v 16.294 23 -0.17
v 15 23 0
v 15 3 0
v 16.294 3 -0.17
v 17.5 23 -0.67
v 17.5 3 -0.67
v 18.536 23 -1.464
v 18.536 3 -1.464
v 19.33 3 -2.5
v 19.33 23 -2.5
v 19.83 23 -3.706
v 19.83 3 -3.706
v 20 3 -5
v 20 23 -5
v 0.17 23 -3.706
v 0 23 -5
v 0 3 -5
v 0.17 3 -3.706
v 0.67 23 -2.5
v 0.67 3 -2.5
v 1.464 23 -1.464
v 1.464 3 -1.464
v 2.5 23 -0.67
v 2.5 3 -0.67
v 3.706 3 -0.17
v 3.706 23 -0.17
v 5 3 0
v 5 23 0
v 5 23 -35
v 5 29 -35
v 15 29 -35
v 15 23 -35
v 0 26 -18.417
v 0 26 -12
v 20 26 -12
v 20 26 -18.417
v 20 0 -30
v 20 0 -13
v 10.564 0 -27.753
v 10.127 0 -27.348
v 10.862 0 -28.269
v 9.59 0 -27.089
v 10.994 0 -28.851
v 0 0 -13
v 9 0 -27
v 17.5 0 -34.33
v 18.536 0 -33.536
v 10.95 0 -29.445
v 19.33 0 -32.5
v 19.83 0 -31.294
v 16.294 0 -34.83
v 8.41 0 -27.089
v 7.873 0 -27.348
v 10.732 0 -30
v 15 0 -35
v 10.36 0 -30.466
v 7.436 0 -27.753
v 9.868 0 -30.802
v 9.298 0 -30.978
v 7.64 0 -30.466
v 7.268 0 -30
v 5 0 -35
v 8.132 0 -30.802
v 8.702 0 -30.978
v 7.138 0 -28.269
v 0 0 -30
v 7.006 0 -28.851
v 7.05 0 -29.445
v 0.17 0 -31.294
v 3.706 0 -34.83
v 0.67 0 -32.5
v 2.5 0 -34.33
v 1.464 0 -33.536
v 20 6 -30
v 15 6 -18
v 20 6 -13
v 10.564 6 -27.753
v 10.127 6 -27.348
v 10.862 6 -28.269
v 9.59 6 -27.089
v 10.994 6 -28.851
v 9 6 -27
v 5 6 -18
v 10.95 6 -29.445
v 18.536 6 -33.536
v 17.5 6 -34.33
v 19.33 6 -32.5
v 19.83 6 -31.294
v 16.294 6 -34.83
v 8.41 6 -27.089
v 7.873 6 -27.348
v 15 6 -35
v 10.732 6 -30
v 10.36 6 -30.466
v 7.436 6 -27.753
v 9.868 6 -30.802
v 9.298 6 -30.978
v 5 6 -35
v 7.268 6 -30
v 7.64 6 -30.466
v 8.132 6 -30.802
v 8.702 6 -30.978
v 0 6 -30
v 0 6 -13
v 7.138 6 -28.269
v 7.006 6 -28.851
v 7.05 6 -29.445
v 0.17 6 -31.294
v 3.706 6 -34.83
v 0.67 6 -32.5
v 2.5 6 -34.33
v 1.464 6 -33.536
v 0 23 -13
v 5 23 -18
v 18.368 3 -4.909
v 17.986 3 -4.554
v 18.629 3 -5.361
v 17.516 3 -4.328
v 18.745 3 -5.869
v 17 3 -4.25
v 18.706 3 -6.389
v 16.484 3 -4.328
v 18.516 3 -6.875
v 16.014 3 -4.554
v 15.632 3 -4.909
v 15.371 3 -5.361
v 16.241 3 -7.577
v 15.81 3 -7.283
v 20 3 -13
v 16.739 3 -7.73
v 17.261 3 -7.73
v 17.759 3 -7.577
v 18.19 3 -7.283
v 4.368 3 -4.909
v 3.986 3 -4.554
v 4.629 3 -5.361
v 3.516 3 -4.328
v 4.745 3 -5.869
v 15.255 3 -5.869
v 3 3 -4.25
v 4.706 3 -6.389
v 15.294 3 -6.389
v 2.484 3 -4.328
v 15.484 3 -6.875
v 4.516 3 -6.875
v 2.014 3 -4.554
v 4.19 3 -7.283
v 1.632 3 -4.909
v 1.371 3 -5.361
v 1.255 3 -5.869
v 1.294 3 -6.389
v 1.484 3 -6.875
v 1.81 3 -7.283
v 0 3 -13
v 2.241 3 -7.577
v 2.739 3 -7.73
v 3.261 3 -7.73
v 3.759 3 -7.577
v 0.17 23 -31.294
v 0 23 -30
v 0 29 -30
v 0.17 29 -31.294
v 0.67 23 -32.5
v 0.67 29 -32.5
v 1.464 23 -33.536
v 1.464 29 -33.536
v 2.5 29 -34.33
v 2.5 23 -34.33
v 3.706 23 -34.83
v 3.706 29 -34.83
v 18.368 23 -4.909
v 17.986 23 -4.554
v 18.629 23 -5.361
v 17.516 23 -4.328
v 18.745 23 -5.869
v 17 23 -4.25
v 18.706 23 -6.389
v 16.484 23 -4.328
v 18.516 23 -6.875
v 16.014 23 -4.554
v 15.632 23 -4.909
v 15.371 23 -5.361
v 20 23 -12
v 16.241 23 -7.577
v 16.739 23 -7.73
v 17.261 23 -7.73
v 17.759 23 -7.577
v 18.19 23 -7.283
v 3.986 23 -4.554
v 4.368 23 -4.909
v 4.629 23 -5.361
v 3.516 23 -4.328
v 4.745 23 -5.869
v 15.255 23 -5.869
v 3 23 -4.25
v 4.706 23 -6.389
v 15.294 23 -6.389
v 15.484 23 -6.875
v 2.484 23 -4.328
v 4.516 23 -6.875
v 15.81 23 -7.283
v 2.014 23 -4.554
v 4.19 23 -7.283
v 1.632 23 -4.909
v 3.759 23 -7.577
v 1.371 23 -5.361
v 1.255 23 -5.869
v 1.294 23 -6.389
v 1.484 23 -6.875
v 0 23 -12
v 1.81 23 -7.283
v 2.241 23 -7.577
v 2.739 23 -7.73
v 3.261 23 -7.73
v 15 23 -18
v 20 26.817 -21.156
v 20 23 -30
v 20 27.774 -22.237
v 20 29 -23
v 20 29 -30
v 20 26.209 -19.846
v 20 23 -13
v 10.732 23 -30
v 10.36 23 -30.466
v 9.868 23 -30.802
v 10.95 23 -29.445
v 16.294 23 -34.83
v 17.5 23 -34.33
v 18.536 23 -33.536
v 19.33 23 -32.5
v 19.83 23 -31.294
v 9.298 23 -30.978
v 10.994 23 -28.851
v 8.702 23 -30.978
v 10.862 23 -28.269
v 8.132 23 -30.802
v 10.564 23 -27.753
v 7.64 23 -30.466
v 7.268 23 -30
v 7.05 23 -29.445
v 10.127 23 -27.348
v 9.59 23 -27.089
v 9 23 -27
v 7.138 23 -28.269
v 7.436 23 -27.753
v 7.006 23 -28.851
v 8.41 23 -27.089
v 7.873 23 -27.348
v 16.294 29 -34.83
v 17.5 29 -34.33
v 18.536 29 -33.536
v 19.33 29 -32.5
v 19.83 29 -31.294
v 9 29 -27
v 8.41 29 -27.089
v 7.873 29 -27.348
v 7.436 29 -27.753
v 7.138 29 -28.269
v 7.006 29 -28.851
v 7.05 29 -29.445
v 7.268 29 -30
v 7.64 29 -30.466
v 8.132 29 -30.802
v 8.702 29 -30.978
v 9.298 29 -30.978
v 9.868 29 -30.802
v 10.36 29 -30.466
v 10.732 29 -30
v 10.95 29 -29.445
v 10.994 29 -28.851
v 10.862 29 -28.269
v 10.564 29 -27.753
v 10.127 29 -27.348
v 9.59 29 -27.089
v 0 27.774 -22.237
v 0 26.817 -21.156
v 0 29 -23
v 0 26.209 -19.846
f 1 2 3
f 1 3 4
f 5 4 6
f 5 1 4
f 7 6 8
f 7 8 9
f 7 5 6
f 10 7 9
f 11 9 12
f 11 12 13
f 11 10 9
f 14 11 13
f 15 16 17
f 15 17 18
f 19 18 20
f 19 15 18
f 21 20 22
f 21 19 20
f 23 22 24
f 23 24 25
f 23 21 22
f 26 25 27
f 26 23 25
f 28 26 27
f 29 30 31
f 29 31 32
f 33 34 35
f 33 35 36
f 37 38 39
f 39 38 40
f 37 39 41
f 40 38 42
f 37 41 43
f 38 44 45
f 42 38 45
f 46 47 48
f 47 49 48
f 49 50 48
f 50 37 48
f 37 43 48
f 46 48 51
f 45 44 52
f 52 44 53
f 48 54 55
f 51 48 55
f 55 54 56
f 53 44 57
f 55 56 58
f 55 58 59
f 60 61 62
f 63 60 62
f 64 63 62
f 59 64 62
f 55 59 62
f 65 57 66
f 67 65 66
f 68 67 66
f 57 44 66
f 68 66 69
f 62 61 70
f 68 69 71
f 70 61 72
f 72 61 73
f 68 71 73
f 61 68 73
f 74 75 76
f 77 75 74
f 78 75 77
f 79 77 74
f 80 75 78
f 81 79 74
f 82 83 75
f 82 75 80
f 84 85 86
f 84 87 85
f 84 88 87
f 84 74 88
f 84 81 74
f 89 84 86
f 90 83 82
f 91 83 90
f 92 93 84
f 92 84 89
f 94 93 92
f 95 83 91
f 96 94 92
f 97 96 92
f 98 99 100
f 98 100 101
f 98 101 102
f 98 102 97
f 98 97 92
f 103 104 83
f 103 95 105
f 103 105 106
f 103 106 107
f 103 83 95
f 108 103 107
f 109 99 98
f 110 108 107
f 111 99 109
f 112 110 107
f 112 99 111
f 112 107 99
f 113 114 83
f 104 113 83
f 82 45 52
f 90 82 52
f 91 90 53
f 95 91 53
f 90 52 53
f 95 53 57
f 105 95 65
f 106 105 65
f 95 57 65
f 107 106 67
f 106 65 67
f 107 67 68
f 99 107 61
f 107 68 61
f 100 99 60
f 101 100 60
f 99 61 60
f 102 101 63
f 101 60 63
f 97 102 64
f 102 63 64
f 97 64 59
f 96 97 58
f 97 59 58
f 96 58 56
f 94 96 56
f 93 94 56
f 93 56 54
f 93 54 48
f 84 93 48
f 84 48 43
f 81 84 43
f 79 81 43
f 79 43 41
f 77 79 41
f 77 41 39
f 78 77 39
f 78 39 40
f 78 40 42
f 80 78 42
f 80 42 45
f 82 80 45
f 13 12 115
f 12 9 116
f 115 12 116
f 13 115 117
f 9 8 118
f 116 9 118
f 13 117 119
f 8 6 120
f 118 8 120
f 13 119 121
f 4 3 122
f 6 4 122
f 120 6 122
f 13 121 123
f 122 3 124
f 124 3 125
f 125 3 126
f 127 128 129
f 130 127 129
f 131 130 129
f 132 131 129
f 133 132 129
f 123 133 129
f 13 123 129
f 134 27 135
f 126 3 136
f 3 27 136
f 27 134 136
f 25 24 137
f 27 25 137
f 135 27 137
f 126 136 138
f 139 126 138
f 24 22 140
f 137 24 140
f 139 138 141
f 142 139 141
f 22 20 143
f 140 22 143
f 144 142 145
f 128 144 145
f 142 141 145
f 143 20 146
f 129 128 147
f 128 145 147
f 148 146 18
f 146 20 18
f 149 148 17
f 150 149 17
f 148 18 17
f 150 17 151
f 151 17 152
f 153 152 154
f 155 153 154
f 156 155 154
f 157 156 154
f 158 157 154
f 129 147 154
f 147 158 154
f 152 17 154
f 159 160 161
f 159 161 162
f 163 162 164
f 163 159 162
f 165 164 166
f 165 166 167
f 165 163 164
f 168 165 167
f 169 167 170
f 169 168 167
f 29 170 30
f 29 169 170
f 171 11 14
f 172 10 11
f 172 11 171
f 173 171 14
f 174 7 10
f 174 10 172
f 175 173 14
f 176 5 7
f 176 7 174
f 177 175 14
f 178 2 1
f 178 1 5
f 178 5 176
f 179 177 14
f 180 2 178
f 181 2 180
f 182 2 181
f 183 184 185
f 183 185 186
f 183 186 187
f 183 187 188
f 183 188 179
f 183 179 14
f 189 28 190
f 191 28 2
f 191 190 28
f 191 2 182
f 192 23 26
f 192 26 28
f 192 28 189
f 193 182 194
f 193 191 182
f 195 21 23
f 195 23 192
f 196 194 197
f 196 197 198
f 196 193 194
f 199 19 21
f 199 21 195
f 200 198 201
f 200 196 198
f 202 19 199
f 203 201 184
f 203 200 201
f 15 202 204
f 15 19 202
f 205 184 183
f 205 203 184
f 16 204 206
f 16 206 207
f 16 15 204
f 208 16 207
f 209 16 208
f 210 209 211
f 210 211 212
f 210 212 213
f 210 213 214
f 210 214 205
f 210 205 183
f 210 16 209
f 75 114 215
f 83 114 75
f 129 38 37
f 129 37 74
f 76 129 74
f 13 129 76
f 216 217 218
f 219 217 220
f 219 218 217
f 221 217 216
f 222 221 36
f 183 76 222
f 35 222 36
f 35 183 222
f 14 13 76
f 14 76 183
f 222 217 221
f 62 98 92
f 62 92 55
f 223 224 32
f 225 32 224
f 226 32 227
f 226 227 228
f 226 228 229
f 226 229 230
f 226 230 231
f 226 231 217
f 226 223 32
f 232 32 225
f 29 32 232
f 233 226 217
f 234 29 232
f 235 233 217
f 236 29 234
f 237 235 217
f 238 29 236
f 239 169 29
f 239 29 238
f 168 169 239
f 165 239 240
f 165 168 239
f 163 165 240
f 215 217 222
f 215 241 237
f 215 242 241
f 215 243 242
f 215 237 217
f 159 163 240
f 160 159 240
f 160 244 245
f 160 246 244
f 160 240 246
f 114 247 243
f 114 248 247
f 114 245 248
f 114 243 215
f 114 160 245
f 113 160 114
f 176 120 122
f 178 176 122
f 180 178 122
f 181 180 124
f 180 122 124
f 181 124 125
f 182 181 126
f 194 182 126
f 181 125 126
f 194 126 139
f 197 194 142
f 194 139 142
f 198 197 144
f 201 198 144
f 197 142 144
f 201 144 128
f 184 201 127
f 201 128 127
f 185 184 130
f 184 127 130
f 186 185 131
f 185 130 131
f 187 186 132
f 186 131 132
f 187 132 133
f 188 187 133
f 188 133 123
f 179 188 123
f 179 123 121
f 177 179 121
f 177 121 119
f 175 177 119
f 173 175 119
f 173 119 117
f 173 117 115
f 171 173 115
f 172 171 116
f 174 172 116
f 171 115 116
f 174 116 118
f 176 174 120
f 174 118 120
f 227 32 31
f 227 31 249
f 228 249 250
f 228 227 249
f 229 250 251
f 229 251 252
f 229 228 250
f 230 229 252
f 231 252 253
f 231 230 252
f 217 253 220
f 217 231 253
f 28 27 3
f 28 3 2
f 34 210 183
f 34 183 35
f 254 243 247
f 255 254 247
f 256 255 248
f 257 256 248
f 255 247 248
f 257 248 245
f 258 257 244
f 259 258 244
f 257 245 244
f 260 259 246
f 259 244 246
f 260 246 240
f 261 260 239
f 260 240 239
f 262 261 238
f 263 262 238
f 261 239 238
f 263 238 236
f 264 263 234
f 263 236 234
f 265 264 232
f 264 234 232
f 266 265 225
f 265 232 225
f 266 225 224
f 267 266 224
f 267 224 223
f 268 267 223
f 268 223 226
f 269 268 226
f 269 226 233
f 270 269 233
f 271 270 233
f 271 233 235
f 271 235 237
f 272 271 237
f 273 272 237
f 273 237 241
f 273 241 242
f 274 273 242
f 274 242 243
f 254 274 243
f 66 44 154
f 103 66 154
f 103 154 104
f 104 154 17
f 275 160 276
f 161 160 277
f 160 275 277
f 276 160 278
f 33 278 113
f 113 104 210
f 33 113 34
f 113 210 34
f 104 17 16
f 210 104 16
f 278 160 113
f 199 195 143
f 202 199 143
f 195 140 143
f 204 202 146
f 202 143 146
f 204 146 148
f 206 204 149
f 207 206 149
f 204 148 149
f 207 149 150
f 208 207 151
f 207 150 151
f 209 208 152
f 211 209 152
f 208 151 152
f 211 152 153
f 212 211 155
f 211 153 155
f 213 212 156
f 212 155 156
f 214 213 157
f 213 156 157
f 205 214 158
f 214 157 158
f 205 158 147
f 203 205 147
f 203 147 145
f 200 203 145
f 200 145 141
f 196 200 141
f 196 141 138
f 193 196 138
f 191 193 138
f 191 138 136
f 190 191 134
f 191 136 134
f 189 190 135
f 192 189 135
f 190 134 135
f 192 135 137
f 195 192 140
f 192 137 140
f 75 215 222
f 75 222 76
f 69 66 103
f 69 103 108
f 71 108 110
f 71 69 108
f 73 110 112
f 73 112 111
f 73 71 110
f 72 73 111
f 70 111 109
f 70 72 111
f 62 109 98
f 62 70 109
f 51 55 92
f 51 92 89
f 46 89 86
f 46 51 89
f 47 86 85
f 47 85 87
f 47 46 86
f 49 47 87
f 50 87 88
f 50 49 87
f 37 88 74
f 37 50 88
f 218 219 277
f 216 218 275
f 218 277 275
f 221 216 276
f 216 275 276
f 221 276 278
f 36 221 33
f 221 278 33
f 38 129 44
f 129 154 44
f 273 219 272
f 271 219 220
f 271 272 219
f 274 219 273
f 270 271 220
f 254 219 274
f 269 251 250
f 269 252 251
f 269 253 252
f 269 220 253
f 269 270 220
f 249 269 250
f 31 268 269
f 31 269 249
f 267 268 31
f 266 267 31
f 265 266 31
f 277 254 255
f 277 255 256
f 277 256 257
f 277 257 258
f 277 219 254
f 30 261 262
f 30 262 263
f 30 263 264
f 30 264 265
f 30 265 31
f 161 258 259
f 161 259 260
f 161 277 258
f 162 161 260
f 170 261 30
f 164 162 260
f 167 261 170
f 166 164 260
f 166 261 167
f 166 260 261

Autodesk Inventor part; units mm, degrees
ref_plane "YZ Plane" through (0, 0, 0) normal (1, 0, 0) x (0, 1, 0)
ref_plane "XZ Plane" through (0, 0, 0) normal (0, 1, 0) x (-1, 0, 0)
ref_plane "XY Plane" through (0, 0, 0) normal (0, 0, 1) x (1, 0, 0)
sketch "Esquisse1" plane through (0, 0, 0) normal (1, 0, 0) x (0, 1, 0)
  line L0 (3, 0) -> (23, 0)
  line L1 (23, 0) -> (23, -12)
  line L2 (23, -12) -> (26, -12)
  line L3 (26, -12) -> (26, -23)
  line L4 (29, -35) -> (23, -35)
  line L5 (23, -35) -> (23, -18)
  line L6 (23, -18) -> (6, -18)
  line L7 (6, -18) -> (6, -35)
  line L8 (6, -35) -> (0, -35)
  line L9 (26, -23) -> (29, -23)
  line L10 (29, -23) -> (29, -35)
  line L11 (3, 0) -> (3, -13)
  line L12 (3, -13) -> (0, -13)
  line L13 (0, -13) -> (0, -35)
  point P0 (0, 0)
  dimension "d0" = 35
  dimension "d2" = 17
  dimension "d4" = 17
  dimension "d6" = 3
  dimension "d7" = 12
  dimension "d8" = 12
  dimension "d10" = 3
  dimension "d34" = 13
  dimension "d35" = 3
  dimension "d36" = 29
  dimension "d37" = 6
  dimension "d38" = 0
  dimension "d44" = 0
extrude "Extrusion1" add sketch "Esquisse1" along normal blind 20
sketch "Esquisse2" plane through (0, 29, -23) normal (0, 1, 0) x (1, 0, 0)
  line L0 (0, 12) -> (20, 12) projected
  line L1 (20, 12) -> (20, 0) projected
  point P0 (0, -23)
  point P1 (9, 6)
  dimension "d20" = 6
  dimension "d21" = 11
hole "Perçage1" at (9, 29, -29) direction (0, -1, 0) diameter 4 end through all
sketch "Esquisse3" plane through (0, 23, 0) normal (0, 1, 0) x (1, 0, 0)
  line L0 (0, 0) -> (20, 0) projected
  line L1 (0, 12) -> (0, 0) projected
  point P0 (3, 6)
  dimension "d29" = 6
  dimension "d30" = 3
hole "Perçage2" at (3, 23, -6) direction (0, -1, 0) diameter 3.5 end through all
pattern_linear "Réseau rectangulaire1" count 2 spacing 14 along (1, 0, 0) of "Perçage2"
chamfer "Chanfrein1" distance 5 angle 45 2 edges at (0, 14.5, -18) (20, 14.5, -18)
fillet "Congé1" radius 5 6 edges at (0, 26, -35) (20, 26, -35) (0, 3, -35) (20, 3, -35) (20, 13, 0) (0, 13, 0)
fillet "Congé2" radius 5 1 edges at (10, 26, -23)
properties part number "support_avant_3DPrint"
